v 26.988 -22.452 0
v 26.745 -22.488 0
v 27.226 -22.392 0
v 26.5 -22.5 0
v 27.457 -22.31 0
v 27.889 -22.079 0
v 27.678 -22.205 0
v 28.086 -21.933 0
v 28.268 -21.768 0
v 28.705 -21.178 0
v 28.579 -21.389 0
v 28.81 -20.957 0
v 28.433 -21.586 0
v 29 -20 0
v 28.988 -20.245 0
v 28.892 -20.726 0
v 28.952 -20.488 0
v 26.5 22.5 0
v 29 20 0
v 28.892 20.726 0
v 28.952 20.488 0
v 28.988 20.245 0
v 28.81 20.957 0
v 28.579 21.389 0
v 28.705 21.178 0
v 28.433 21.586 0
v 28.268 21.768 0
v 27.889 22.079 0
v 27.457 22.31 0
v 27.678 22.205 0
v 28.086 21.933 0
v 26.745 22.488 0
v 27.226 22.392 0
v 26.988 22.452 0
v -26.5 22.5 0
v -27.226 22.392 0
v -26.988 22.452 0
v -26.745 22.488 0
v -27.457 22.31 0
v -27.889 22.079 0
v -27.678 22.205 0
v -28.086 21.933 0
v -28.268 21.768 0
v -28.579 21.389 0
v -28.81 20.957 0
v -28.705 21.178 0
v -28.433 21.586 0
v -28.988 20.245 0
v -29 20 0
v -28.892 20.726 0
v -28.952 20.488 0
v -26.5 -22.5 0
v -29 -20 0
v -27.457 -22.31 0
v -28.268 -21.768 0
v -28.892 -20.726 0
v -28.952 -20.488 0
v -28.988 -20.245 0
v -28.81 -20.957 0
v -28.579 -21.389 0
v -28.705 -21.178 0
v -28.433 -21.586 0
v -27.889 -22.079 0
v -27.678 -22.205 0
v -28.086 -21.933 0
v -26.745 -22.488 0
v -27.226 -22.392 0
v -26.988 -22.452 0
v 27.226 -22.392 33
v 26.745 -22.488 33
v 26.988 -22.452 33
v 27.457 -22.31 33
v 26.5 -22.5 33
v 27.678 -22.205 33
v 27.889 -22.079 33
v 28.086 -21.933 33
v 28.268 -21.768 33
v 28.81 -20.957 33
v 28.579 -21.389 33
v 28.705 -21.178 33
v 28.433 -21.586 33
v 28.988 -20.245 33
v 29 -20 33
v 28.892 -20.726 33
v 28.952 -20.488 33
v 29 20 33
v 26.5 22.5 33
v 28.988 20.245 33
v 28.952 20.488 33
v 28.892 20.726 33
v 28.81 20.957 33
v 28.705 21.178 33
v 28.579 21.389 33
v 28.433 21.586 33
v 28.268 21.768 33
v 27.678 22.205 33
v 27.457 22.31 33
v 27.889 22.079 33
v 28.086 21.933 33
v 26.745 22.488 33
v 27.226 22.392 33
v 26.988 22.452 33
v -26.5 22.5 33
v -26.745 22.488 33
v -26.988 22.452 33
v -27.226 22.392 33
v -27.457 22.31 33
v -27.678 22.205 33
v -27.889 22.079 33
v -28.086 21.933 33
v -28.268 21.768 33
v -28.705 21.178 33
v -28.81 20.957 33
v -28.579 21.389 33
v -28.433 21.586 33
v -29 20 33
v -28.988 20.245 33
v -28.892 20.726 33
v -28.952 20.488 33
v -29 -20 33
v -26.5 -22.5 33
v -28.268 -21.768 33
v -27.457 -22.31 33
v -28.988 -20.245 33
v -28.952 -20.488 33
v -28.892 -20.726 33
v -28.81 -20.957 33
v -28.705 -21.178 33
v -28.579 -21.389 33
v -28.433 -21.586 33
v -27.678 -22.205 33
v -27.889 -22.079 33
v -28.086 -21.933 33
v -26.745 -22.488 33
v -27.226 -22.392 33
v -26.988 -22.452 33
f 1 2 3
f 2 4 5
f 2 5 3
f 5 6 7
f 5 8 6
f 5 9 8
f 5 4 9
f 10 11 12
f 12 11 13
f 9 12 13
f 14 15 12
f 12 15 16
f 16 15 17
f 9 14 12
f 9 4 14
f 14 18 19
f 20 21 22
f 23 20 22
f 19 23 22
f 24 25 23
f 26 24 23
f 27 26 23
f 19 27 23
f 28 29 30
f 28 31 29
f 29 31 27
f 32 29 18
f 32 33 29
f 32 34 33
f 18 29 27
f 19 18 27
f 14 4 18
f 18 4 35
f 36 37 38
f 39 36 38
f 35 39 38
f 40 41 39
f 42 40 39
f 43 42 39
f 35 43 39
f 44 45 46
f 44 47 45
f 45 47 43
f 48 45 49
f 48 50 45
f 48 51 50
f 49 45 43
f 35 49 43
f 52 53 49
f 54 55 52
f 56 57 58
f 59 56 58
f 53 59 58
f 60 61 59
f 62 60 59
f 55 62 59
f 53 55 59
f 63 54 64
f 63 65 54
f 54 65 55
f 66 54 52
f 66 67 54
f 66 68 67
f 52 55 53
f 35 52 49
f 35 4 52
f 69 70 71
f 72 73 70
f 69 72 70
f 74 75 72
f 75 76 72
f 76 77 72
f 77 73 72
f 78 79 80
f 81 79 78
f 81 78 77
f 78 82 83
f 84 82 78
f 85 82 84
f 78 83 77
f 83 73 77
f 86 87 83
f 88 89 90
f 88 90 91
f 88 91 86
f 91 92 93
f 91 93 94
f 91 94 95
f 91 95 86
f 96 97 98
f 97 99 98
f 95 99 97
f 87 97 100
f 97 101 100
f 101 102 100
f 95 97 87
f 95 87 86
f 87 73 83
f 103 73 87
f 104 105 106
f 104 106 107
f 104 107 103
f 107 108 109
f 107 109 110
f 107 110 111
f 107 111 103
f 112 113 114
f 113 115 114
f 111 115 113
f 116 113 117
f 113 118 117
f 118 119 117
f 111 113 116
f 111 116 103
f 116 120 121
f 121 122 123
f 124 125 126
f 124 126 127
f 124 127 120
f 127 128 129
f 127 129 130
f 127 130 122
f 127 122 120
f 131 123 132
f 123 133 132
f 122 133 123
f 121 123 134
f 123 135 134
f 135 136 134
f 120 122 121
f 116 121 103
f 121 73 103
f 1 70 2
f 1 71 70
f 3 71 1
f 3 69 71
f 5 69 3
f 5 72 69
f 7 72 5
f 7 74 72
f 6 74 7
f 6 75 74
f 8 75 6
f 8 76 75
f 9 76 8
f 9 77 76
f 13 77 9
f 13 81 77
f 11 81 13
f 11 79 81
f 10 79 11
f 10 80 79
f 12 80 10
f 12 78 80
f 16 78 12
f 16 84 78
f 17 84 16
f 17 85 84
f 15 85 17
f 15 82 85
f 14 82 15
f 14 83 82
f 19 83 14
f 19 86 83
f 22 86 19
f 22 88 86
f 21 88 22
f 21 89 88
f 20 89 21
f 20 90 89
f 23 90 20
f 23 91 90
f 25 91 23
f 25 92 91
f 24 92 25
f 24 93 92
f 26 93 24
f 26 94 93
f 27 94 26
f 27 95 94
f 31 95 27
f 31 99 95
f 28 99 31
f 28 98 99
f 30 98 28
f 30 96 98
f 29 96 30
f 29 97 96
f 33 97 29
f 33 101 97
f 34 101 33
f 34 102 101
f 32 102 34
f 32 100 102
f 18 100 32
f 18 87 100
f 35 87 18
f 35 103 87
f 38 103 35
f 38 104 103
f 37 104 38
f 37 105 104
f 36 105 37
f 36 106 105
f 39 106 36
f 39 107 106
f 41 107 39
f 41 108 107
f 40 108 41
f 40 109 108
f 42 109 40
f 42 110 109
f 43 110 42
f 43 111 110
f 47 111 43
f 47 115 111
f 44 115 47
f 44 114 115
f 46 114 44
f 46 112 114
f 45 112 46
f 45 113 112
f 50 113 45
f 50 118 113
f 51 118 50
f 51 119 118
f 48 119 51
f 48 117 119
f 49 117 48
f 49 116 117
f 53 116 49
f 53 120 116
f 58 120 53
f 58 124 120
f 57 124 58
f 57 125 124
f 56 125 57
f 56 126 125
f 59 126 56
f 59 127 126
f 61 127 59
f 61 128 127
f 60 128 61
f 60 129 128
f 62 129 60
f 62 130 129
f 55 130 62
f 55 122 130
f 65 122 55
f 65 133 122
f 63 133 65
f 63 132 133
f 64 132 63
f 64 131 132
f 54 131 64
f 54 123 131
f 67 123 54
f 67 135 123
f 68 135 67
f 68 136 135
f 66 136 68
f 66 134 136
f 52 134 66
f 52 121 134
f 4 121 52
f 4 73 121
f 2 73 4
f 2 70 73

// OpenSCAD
$fn = 64;

module ssr_module(size=[58,45,33], corner_r=2.5) {
    x = size[0];
    y = size[1];
    z = size[2];

    // Main body: rounded rectangular prism
    color([0.85,0.85,0.85])
    linear_extrude(height=z)
        offset(r=corner_r)
            square([x-2*corner_r, y-2*corner_r], center=true);
}

ssr_module([58.0,45.0,33.0], corner_r=2.5);
